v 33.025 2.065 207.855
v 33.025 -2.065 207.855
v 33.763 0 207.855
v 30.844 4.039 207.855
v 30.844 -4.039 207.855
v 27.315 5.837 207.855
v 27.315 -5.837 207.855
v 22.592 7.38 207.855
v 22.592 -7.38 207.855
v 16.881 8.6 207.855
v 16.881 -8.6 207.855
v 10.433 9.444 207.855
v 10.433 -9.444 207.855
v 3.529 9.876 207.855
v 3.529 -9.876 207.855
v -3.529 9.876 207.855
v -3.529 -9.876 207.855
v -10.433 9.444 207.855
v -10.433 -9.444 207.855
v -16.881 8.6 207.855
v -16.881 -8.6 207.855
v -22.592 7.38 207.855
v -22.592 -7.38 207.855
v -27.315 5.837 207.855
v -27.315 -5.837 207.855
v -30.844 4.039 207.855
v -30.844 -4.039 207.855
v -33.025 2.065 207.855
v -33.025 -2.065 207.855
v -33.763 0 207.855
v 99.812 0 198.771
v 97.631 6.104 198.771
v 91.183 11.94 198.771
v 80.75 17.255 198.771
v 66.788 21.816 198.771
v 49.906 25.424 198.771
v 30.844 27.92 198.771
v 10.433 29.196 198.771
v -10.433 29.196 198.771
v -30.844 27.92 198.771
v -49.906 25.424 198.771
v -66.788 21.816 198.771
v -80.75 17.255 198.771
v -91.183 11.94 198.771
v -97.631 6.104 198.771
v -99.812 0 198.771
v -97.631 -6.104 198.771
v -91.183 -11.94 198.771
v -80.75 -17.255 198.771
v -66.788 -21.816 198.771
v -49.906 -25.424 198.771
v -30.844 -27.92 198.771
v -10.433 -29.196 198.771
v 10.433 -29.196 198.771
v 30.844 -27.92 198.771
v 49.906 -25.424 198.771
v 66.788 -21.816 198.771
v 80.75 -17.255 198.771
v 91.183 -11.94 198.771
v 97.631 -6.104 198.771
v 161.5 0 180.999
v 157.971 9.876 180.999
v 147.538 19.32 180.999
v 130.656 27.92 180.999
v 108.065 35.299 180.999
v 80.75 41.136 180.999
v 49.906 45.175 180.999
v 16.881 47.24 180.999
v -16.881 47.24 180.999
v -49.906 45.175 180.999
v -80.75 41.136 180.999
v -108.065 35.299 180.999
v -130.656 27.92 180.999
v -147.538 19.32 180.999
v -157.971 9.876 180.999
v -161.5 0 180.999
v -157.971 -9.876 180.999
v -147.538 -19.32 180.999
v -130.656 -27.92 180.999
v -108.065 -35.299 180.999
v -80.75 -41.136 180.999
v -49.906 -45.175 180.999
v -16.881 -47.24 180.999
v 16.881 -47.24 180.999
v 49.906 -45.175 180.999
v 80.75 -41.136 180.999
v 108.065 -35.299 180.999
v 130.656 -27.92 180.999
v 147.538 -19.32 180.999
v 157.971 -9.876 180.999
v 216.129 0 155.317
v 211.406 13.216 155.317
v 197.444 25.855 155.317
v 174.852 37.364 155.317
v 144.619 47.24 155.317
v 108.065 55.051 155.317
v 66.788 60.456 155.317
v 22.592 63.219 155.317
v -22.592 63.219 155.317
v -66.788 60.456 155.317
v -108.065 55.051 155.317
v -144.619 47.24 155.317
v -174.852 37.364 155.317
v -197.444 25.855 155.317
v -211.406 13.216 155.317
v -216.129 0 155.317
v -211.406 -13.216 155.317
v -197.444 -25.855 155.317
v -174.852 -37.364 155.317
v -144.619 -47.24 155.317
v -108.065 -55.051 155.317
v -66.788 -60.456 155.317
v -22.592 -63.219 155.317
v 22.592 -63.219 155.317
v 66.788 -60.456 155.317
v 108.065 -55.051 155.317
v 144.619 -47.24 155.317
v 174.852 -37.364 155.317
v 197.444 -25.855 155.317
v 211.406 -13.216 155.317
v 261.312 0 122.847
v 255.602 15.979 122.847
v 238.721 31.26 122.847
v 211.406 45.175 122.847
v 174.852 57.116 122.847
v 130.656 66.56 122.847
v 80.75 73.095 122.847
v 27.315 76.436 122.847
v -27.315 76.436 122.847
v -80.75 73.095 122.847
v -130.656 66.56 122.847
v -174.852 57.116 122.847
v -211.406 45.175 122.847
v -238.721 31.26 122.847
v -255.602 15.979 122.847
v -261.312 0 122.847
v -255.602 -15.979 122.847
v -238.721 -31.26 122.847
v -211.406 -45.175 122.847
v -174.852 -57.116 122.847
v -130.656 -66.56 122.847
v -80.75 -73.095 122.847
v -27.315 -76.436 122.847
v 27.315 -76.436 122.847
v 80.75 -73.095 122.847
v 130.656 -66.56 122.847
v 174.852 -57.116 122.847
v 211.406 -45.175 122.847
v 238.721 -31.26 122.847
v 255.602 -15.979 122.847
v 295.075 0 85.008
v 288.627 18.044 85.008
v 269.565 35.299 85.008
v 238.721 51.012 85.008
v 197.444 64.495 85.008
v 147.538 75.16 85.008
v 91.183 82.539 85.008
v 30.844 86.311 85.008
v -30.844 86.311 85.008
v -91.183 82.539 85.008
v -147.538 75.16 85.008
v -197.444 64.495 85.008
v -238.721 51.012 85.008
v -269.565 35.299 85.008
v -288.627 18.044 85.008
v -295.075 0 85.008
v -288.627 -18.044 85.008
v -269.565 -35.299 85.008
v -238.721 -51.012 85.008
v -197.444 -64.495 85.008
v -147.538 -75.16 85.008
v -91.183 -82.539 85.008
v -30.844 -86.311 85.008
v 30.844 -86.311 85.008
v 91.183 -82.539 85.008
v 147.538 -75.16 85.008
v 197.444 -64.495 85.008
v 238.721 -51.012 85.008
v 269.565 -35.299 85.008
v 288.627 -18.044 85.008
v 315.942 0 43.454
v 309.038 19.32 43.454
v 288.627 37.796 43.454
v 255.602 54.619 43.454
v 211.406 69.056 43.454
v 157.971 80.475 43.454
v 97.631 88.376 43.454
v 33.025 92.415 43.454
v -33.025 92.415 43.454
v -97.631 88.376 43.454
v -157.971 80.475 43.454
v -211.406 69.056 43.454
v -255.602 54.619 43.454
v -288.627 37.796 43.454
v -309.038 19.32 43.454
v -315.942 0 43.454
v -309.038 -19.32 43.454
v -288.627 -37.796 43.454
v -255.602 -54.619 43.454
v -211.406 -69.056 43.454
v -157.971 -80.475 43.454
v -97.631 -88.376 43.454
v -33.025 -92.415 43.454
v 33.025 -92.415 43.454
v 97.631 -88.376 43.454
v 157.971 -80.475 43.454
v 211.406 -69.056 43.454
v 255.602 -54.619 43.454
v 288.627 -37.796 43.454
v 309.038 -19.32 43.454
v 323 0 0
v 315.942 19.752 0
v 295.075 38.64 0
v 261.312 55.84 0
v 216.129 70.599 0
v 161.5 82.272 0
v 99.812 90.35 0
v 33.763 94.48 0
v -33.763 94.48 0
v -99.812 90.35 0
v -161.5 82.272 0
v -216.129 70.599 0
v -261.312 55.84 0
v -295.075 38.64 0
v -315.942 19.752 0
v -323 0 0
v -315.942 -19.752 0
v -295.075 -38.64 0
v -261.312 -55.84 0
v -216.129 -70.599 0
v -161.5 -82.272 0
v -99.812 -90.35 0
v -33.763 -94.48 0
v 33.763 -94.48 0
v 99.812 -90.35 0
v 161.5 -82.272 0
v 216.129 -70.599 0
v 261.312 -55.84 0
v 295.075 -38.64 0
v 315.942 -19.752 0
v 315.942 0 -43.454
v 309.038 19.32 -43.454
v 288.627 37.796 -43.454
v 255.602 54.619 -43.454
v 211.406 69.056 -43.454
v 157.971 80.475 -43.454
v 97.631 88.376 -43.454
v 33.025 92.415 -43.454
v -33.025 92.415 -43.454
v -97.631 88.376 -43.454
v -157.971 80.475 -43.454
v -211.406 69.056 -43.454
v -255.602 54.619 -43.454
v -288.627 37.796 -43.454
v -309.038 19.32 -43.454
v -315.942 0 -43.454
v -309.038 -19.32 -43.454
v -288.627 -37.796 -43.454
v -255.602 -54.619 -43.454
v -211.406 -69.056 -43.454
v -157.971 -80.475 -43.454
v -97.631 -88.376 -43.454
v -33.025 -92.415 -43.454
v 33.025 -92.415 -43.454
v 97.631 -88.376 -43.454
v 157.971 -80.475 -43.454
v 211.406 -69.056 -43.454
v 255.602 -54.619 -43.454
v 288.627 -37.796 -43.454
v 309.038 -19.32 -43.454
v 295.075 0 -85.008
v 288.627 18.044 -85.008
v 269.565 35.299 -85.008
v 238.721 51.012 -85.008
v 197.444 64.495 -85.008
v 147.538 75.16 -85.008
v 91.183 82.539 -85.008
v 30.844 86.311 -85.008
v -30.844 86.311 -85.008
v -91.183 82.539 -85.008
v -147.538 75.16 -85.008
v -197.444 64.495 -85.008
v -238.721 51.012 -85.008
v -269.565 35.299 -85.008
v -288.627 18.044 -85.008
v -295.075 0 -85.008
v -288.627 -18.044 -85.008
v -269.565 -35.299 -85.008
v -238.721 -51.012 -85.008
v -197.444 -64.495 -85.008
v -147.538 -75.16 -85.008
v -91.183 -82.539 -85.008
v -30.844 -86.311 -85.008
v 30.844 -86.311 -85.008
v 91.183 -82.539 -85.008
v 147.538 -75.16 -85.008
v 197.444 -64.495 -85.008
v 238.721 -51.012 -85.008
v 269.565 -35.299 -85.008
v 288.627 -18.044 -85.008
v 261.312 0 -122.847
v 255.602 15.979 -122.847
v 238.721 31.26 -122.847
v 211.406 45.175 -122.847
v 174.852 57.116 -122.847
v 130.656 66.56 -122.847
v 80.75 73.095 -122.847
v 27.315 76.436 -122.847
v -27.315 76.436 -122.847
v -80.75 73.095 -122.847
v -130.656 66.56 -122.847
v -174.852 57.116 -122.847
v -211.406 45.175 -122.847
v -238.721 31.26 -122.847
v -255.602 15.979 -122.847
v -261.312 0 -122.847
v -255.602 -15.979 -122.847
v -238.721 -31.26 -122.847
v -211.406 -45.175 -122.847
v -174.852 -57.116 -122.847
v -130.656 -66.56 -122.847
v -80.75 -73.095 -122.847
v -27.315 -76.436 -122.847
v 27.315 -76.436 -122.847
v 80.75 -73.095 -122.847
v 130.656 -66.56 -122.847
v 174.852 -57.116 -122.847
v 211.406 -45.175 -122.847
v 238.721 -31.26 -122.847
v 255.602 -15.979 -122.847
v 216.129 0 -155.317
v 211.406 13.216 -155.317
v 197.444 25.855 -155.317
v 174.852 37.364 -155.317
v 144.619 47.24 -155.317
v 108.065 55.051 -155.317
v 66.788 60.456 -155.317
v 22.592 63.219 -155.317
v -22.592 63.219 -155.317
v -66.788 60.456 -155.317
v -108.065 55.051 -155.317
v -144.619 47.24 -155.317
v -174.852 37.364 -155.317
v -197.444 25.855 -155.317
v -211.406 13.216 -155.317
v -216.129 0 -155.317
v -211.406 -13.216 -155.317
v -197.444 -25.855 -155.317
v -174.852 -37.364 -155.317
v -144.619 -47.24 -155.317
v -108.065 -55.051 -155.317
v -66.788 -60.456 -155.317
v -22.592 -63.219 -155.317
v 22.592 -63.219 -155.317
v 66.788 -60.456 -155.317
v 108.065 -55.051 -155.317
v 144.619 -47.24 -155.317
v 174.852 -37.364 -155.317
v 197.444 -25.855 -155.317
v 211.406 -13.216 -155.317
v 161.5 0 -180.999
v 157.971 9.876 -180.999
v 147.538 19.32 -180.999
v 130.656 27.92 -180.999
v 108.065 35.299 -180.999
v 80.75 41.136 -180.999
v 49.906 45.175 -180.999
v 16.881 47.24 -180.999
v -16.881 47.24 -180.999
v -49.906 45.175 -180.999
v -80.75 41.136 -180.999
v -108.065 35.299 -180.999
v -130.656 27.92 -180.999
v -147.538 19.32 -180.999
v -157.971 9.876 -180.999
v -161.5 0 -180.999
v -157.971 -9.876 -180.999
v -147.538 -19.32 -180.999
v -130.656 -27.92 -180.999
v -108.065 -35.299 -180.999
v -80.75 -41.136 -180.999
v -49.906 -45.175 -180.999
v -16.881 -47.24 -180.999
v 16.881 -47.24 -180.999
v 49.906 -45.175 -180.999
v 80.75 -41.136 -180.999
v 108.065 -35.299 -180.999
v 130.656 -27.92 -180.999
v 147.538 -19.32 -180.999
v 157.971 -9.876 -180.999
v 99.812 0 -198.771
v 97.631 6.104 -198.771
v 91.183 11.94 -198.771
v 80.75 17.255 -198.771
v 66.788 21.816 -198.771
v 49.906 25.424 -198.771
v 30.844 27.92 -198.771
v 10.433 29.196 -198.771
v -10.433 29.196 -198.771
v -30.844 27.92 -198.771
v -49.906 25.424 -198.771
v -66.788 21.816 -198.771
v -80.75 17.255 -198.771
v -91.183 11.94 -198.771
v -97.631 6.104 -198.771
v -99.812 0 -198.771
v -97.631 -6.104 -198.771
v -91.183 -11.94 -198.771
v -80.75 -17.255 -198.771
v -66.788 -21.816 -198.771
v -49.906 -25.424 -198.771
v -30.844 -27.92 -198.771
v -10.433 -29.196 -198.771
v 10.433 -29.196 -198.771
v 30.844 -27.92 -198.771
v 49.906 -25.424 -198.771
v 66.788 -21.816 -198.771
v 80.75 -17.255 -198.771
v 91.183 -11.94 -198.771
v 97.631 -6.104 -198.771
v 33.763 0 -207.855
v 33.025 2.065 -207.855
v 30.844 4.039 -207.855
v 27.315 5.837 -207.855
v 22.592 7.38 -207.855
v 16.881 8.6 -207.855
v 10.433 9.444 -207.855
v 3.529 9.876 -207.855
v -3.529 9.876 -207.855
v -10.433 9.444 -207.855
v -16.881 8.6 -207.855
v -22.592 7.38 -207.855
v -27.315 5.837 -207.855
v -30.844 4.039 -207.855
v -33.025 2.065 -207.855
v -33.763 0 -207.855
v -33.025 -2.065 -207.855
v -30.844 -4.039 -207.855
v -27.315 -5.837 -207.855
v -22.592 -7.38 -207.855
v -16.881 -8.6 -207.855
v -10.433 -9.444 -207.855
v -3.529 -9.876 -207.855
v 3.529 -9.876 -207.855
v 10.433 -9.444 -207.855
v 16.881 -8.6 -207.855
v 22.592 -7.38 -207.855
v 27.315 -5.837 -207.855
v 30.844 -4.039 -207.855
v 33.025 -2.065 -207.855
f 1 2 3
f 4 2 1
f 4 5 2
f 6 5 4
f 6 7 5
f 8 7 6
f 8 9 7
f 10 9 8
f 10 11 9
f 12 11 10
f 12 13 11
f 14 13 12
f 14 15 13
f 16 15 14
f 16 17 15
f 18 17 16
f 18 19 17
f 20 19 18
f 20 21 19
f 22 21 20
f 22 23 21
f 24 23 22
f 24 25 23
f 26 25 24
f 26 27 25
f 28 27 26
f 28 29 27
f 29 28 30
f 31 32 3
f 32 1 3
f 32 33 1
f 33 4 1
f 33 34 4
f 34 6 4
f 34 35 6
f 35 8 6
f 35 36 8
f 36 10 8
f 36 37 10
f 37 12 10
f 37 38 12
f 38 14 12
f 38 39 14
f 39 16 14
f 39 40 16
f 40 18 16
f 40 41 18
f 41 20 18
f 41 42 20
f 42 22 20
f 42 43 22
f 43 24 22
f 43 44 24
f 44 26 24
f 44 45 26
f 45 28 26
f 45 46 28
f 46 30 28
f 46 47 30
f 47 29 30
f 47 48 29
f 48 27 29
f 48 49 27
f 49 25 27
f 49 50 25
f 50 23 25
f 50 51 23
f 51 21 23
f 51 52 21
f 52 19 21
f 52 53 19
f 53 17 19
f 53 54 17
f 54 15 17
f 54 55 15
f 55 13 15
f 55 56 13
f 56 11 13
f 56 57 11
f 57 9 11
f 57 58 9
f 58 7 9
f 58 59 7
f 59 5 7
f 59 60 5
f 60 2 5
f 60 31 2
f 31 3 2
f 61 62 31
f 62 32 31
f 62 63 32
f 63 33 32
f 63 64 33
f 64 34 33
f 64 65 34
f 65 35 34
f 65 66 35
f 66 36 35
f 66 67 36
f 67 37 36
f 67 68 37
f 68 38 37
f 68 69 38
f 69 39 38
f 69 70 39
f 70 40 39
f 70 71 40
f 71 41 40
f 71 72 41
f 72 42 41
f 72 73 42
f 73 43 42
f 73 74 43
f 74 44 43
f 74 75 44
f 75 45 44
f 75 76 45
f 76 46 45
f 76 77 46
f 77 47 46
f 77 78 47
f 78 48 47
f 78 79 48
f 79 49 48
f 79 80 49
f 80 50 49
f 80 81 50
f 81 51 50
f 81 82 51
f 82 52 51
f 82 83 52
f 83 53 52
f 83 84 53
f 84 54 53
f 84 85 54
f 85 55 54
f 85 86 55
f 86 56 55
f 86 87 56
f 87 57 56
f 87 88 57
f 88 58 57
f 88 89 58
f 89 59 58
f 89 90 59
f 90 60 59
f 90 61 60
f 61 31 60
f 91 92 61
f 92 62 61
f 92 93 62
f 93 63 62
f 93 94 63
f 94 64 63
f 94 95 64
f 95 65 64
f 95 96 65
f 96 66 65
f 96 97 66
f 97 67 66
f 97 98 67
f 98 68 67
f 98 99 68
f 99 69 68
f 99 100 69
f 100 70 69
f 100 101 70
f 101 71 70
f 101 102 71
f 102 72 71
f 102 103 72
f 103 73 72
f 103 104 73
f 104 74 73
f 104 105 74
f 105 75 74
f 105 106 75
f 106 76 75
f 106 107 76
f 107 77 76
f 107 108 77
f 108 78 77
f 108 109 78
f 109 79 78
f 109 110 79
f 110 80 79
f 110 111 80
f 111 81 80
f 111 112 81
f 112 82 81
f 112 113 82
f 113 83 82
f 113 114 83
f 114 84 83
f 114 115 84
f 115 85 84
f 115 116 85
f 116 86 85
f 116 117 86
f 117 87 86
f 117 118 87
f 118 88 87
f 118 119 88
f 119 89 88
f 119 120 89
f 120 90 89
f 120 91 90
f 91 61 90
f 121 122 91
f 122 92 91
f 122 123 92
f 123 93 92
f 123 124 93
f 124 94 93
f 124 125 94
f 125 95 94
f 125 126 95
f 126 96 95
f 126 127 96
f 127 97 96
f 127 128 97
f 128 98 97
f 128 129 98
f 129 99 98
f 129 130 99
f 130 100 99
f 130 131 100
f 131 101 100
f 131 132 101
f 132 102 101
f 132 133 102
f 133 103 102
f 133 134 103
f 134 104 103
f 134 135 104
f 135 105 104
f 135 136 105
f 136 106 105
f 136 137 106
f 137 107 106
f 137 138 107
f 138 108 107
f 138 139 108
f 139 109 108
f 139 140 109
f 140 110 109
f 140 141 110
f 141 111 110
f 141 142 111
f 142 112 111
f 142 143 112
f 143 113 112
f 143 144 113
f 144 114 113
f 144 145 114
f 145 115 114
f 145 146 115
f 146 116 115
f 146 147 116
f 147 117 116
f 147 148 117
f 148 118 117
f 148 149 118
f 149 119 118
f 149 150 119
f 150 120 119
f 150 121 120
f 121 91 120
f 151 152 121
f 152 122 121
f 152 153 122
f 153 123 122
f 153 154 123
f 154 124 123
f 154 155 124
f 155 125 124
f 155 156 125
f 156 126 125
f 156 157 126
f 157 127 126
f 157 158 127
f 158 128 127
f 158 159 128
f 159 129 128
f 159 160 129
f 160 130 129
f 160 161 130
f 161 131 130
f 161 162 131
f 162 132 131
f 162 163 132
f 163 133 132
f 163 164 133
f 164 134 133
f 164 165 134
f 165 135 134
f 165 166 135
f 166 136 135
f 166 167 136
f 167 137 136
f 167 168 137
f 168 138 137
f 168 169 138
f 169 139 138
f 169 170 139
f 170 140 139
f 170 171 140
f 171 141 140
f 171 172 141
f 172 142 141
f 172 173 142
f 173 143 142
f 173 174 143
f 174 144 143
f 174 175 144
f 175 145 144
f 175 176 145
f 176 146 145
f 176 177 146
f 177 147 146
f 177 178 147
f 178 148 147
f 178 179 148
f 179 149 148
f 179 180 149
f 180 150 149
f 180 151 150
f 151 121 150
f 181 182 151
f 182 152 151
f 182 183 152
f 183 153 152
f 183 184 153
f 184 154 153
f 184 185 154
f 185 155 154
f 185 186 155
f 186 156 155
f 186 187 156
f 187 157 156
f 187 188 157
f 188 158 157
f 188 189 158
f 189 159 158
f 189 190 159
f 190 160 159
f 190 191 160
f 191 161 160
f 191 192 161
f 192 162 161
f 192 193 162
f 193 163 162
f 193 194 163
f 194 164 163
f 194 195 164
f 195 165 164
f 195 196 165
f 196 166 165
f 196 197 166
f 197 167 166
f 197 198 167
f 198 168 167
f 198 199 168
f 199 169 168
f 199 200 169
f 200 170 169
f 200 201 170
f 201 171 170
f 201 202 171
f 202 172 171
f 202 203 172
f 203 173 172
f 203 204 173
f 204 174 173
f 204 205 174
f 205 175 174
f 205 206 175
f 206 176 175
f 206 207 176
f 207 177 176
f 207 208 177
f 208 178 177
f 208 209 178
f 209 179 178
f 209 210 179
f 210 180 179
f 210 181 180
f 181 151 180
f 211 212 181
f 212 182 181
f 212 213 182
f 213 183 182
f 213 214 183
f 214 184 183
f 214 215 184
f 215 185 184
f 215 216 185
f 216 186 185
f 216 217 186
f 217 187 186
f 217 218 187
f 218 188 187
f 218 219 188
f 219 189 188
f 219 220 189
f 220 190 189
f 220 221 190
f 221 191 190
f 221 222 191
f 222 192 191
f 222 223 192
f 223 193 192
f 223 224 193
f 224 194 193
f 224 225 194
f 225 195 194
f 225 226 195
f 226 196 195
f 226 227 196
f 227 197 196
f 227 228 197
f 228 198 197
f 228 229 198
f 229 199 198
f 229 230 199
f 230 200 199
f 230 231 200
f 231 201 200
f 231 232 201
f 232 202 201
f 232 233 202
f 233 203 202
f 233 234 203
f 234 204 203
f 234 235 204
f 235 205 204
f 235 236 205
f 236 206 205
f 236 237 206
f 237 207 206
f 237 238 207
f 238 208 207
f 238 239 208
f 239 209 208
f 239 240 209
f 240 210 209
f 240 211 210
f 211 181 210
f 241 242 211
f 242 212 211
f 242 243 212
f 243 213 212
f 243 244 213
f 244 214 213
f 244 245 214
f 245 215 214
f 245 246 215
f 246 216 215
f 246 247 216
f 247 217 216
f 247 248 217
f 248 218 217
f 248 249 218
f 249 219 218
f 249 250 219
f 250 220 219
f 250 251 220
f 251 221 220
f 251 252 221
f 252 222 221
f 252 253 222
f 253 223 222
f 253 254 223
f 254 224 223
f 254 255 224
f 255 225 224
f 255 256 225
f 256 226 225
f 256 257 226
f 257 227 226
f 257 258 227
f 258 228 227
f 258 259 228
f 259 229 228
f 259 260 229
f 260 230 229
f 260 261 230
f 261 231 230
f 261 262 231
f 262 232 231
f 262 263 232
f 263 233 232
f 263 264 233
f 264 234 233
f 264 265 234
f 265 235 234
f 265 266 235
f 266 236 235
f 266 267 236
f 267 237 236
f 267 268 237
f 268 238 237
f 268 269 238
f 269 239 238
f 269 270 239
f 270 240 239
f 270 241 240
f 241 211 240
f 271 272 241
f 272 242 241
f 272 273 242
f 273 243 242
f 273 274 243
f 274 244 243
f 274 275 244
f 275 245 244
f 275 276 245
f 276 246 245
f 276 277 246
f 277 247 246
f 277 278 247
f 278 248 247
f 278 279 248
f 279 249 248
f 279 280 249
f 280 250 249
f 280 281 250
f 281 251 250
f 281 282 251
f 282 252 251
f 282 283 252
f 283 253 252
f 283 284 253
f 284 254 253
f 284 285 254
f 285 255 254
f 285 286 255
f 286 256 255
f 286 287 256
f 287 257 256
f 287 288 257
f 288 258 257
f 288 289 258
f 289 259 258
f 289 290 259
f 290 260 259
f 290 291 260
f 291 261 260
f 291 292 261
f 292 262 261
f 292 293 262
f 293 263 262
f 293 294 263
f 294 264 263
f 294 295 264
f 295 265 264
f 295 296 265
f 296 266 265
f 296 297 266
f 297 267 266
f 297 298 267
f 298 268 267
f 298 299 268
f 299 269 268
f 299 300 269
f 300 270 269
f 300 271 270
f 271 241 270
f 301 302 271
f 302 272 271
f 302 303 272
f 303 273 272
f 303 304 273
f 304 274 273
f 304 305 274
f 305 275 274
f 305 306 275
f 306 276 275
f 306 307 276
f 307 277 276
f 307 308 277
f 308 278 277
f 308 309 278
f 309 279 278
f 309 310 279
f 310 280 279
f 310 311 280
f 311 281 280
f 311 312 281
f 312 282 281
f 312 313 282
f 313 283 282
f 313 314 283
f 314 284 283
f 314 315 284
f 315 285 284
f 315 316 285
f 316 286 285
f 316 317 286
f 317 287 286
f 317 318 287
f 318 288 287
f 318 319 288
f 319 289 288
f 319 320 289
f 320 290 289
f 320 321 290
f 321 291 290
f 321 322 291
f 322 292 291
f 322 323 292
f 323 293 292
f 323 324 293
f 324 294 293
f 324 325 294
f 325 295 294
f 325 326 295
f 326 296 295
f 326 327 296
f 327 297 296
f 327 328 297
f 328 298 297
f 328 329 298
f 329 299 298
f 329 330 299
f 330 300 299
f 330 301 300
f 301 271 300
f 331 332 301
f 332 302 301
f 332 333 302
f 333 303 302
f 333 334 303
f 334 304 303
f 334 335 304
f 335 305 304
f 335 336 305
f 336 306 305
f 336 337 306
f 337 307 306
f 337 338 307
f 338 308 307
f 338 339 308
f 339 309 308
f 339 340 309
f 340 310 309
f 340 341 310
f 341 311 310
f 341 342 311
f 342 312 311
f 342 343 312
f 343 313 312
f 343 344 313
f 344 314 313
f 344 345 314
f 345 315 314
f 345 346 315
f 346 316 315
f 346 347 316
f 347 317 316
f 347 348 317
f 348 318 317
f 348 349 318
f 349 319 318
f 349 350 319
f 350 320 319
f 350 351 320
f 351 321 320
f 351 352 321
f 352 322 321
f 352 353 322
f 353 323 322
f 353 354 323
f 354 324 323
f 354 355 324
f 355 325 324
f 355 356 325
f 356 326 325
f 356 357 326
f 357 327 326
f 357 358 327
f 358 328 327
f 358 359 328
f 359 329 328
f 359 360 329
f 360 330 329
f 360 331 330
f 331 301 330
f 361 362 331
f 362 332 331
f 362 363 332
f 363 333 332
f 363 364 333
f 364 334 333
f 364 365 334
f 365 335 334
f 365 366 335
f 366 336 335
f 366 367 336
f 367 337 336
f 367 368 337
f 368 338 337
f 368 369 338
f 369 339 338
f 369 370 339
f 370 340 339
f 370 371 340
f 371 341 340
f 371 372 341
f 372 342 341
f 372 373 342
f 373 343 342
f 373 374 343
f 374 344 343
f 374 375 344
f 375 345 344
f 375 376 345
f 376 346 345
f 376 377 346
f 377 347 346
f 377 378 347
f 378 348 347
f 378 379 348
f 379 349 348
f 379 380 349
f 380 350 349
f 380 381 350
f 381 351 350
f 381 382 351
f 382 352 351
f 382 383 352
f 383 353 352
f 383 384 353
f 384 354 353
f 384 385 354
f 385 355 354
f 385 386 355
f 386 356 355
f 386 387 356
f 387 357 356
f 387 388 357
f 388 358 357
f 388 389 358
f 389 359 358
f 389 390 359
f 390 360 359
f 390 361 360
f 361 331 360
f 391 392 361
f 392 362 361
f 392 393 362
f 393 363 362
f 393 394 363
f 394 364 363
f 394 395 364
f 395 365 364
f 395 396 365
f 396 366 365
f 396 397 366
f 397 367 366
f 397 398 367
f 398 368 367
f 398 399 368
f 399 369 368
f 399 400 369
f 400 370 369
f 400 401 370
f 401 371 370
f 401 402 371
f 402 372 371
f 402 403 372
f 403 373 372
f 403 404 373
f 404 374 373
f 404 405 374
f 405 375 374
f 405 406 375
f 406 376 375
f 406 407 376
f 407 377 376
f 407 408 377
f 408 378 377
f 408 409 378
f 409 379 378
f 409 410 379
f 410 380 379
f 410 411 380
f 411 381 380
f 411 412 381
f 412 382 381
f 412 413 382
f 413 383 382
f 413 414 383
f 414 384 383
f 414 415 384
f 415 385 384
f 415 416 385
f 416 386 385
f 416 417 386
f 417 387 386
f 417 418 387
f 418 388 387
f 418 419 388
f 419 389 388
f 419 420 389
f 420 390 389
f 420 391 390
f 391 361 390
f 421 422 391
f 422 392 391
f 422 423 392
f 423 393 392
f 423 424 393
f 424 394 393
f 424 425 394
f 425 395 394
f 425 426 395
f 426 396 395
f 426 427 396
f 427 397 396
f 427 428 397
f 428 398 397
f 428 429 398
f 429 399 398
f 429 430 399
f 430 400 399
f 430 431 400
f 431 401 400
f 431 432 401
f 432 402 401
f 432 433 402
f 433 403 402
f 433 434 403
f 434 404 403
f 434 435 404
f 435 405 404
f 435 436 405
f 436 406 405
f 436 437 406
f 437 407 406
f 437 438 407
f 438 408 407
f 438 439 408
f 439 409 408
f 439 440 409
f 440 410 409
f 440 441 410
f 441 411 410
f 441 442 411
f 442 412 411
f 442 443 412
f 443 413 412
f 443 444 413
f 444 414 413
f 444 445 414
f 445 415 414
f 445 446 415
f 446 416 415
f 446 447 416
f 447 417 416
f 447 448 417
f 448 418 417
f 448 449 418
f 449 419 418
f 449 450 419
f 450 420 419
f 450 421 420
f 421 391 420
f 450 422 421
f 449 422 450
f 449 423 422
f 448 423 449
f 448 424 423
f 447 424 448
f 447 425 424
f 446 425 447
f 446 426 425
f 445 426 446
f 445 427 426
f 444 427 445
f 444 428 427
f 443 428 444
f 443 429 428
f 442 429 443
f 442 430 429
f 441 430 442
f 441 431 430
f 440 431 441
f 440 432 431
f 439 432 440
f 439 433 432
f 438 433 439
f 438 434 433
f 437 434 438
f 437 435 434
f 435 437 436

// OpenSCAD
// Generated by SolidPython 1.0.1 on 2020-07-29 00:46:52


scale(v = [17, 5, 11]) {
	sphere(r = 19);
}
/***********************************************
*********      SolidPython code:      **********
************************************************
 
# import packages: SolidPython
from solid import *
from solid.utils import *
from itertools import chain, combinations, permutations


class Resize:

    def __init__(self, scad_file):
        self.scad_file = scad_file
        #self.scad_file = import_scad(scad_file)
        # cone/cylinder param:
        self.r1 = 0
        self.r2 = 0
        self.h = 0
        # rectangular prism param:
        self.w = 0
        self.l = 0
        # ellipse param:
        self.r = 0

    # import OpenScad code (file name corresponds to shape)


    # classify shape + parameters
    def assign(self, param1, param2, param3):
        if self.scad_file == 'cone.scad':
            self.r1 = param1
            self.r2 = param2
            self.h = param3
        elif self.scad_file == 'cylinder.scad':
            self.r1 = param1
            self.r2 = param2
            self.h = param3
        elif self.scad_file == 'rectangularPrism.scad':
            self.h = param1
            self.l = param2
            self.w = param3
        else:
            self.r = param1
            self.h = param2

    # resize parameters
    def iterate(self):
        x = range(3, 20, 2)
        i = 1
        if self.scad_file == 'cone.scad':
            tempList = list(permutations(x, 2))
            for temp in tempList:
                param1 = temp[0]
                param2 = temp[1]
                filepath = 'produced_scad_files/' + 'cone' + str(param1) + '_' + str(param2) + '_' + '.scad'
                scad_render_to_file(cylinder(h=param1, r1=param2, r2=0), filepath)

        elif self.scad_file == 'cylinder.scad':
            tempList = list(permutations(x, 3))
            for temp in tempList:
                param1 = temp[0]
                param2 = temp[1]
                filepath = 'produced_scad_files/' + 'cylinder' + str(param1) + '_' + str(param2) + '_' + '.scad'
                scad_render_to_file(cylinder(h=param1, r1=param2, r2=param2), filepath)

        elif self.scad_file == 'rectangularPrism.scad':
            tempList = list(permutations(x, 3))
            for temp in tempList:
                param1 = temp[0]
                param2 = temp[1]
                param3 = temp[2]
                filepath = 'produced_scad_files/' + 'rectangularPrism' + str(param1) + '_' + str(param2) + '_' + str(
                    param3) + '.scad'
                scad_render_to_file(cube(size=(param1, param2, param3)), filepath)

        elif self.scad_file == 'ellipse.scad':
            tempList = list(permutations(x, 4))
            for temp in tempList:
                param1 = temp[0]
                param2 = temp[1]
                param3 = temp[2]
                param4 = temp[3]
                filepath = 'produced_scad_files/' + 'ellipse' + str(param1) + '_' + str(param2) + '_' + str(param3) + '_' + str(param4) + '.scad'
                scad_render_to_file(scale([param1, param2, param3])(sphere(r=param4)), filepath)

    def render_to_scadfile(self):
        scad_render_to_file(scad, 'example.scad') 
 
************************************************/
